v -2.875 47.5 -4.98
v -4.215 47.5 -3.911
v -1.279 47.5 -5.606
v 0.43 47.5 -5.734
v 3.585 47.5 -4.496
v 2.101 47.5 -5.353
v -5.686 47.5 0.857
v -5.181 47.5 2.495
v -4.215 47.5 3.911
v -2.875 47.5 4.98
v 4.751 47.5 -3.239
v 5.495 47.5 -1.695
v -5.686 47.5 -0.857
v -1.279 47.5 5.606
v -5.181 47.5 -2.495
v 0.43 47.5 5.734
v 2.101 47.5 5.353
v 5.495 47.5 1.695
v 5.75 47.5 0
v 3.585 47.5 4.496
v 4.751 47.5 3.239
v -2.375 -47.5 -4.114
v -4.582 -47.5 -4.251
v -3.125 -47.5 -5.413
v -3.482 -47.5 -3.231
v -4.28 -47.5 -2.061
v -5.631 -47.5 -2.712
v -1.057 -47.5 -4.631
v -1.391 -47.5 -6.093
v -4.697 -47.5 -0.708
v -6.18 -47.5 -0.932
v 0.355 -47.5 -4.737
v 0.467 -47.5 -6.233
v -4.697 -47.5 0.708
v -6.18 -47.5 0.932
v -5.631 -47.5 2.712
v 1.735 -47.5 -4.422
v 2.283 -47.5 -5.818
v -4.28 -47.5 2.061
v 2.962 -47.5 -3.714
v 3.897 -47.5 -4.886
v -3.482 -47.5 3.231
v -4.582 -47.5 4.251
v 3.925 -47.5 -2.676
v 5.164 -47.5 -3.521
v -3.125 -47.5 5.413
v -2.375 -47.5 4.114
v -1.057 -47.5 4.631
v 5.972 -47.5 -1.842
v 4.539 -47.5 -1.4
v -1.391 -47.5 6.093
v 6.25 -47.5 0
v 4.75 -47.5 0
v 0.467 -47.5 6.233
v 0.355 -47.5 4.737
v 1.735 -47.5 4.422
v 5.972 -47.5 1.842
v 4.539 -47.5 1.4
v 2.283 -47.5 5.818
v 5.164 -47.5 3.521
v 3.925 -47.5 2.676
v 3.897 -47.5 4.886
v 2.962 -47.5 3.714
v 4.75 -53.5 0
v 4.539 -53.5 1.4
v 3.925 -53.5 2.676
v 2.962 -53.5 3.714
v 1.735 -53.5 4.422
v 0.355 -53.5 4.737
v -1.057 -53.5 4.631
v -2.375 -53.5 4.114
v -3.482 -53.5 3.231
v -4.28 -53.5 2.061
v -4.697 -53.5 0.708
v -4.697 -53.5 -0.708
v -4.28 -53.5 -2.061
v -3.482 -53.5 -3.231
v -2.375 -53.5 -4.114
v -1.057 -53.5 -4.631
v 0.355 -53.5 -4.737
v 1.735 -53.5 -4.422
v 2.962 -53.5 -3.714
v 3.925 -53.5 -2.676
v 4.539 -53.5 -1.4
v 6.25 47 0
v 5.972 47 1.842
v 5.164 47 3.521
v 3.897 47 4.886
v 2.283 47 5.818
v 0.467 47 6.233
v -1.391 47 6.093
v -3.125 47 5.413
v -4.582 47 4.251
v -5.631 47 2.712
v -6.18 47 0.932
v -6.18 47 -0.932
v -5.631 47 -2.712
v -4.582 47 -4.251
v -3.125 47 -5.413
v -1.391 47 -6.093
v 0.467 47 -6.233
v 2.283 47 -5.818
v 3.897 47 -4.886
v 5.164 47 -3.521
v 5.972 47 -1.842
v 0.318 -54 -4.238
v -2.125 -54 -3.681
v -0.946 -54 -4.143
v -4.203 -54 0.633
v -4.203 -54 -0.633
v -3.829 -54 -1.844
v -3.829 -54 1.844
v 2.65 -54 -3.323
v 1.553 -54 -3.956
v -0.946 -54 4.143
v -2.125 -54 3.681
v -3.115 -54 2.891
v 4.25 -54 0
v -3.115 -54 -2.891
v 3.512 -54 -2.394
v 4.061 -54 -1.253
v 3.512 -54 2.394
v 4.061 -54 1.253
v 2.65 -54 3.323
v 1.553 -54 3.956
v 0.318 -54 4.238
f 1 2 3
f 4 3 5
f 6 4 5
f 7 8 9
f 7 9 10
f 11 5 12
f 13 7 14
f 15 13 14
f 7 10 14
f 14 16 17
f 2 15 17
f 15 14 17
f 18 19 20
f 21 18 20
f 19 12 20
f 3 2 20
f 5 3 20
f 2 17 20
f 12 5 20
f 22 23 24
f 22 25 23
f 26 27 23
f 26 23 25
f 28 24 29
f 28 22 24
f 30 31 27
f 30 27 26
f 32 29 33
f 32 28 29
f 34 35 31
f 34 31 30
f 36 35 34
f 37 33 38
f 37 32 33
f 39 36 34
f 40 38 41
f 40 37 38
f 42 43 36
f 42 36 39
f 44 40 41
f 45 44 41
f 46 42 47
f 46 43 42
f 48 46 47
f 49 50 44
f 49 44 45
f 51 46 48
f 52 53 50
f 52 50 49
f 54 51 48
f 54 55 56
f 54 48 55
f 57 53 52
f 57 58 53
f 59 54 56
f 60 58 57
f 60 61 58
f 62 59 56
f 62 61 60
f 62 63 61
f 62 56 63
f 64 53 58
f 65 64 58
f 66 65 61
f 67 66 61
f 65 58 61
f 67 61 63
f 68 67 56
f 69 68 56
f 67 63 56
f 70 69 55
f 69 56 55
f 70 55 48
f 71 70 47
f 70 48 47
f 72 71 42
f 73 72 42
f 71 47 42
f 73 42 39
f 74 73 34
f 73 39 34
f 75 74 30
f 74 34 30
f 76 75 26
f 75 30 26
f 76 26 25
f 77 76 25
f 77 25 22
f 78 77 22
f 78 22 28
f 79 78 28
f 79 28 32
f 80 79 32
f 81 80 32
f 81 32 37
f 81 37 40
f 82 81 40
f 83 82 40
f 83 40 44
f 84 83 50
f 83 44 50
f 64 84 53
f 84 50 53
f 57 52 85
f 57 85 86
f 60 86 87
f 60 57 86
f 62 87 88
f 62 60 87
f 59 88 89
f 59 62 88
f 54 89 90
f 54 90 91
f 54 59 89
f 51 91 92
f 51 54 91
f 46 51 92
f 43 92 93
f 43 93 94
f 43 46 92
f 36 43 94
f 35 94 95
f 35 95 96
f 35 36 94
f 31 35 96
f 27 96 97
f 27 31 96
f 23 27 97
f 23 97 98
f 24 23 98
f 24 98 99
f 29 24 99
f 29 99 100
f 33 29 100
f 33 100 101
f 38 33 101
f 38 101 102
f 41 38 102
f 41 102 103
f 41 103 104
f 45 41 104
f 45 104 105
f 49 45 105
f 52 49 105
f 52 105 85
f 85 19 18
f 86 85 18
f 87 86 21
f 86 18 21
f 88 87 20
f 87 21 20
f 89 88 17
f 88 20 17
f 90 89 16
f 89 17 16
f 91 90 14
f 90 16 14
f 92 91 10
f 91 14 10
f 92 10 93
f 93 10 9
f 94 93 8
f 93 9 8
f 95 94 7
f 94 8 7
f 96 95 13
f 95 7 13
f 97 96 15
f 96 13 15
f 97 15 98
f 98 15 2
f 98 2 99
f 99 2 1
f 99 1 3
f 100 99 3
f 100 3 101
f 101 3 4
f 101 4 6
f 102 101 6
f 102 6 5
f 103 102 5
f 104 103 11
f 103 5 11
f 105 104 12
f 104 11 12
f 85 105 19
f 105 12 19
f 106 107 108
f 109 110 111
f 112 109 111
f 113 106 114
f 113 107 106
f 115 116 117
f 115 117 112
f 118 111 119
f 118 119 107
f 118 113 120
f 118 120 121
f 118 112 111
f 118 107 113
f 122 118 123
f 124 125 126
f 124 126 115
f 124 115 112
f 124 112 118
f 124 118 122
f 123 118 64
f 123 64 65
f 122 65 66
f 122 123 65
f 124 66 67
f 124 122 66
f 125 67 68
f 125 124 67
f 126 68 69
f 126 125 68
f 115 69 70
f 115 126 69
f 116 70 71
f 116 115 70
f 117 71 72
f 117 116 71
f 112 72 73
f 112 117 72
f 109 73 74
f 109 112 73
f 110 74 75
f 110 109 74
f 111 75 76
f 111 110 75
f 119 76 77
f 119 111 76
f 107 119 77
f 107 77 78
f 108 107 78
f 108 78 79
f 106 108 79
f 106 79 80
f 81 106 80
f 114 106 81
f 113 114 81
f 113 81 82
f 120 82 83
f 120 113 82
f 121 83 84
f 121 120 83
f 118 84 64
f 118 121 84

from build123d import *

# Parameters (mm, degrees)
F0_R     = 6.25
F1_DEPTH = 47.5
F2_R     = 4.75
F3_DEPTH = 6.5
F4_SIZE  = 0.5


with BuildPart() as f1:
    # F0 (on Front) → F1 (new body, symmetric)
    with BuildSketch(Plane.XZ):
        Circle(F0_R)
    extrude(amount=F1_DEPTH, both=True)

    # F2 (on face) → F3 (join)
    with BuildSketch(Plane.XZ.offset(47.5)):
        Circle(F2_R)
    extrude(amount=F3_DEPTH)

    # F4
    f4_edges = [f1.edges().sort_by_distance(p)[0] for p in [
        (-4.75, -54, 0),
        (-6.25, 47.5, 0),
    ]]
    chamfer(f4_edges, length=F4_SIZE)


solid = f1.part
